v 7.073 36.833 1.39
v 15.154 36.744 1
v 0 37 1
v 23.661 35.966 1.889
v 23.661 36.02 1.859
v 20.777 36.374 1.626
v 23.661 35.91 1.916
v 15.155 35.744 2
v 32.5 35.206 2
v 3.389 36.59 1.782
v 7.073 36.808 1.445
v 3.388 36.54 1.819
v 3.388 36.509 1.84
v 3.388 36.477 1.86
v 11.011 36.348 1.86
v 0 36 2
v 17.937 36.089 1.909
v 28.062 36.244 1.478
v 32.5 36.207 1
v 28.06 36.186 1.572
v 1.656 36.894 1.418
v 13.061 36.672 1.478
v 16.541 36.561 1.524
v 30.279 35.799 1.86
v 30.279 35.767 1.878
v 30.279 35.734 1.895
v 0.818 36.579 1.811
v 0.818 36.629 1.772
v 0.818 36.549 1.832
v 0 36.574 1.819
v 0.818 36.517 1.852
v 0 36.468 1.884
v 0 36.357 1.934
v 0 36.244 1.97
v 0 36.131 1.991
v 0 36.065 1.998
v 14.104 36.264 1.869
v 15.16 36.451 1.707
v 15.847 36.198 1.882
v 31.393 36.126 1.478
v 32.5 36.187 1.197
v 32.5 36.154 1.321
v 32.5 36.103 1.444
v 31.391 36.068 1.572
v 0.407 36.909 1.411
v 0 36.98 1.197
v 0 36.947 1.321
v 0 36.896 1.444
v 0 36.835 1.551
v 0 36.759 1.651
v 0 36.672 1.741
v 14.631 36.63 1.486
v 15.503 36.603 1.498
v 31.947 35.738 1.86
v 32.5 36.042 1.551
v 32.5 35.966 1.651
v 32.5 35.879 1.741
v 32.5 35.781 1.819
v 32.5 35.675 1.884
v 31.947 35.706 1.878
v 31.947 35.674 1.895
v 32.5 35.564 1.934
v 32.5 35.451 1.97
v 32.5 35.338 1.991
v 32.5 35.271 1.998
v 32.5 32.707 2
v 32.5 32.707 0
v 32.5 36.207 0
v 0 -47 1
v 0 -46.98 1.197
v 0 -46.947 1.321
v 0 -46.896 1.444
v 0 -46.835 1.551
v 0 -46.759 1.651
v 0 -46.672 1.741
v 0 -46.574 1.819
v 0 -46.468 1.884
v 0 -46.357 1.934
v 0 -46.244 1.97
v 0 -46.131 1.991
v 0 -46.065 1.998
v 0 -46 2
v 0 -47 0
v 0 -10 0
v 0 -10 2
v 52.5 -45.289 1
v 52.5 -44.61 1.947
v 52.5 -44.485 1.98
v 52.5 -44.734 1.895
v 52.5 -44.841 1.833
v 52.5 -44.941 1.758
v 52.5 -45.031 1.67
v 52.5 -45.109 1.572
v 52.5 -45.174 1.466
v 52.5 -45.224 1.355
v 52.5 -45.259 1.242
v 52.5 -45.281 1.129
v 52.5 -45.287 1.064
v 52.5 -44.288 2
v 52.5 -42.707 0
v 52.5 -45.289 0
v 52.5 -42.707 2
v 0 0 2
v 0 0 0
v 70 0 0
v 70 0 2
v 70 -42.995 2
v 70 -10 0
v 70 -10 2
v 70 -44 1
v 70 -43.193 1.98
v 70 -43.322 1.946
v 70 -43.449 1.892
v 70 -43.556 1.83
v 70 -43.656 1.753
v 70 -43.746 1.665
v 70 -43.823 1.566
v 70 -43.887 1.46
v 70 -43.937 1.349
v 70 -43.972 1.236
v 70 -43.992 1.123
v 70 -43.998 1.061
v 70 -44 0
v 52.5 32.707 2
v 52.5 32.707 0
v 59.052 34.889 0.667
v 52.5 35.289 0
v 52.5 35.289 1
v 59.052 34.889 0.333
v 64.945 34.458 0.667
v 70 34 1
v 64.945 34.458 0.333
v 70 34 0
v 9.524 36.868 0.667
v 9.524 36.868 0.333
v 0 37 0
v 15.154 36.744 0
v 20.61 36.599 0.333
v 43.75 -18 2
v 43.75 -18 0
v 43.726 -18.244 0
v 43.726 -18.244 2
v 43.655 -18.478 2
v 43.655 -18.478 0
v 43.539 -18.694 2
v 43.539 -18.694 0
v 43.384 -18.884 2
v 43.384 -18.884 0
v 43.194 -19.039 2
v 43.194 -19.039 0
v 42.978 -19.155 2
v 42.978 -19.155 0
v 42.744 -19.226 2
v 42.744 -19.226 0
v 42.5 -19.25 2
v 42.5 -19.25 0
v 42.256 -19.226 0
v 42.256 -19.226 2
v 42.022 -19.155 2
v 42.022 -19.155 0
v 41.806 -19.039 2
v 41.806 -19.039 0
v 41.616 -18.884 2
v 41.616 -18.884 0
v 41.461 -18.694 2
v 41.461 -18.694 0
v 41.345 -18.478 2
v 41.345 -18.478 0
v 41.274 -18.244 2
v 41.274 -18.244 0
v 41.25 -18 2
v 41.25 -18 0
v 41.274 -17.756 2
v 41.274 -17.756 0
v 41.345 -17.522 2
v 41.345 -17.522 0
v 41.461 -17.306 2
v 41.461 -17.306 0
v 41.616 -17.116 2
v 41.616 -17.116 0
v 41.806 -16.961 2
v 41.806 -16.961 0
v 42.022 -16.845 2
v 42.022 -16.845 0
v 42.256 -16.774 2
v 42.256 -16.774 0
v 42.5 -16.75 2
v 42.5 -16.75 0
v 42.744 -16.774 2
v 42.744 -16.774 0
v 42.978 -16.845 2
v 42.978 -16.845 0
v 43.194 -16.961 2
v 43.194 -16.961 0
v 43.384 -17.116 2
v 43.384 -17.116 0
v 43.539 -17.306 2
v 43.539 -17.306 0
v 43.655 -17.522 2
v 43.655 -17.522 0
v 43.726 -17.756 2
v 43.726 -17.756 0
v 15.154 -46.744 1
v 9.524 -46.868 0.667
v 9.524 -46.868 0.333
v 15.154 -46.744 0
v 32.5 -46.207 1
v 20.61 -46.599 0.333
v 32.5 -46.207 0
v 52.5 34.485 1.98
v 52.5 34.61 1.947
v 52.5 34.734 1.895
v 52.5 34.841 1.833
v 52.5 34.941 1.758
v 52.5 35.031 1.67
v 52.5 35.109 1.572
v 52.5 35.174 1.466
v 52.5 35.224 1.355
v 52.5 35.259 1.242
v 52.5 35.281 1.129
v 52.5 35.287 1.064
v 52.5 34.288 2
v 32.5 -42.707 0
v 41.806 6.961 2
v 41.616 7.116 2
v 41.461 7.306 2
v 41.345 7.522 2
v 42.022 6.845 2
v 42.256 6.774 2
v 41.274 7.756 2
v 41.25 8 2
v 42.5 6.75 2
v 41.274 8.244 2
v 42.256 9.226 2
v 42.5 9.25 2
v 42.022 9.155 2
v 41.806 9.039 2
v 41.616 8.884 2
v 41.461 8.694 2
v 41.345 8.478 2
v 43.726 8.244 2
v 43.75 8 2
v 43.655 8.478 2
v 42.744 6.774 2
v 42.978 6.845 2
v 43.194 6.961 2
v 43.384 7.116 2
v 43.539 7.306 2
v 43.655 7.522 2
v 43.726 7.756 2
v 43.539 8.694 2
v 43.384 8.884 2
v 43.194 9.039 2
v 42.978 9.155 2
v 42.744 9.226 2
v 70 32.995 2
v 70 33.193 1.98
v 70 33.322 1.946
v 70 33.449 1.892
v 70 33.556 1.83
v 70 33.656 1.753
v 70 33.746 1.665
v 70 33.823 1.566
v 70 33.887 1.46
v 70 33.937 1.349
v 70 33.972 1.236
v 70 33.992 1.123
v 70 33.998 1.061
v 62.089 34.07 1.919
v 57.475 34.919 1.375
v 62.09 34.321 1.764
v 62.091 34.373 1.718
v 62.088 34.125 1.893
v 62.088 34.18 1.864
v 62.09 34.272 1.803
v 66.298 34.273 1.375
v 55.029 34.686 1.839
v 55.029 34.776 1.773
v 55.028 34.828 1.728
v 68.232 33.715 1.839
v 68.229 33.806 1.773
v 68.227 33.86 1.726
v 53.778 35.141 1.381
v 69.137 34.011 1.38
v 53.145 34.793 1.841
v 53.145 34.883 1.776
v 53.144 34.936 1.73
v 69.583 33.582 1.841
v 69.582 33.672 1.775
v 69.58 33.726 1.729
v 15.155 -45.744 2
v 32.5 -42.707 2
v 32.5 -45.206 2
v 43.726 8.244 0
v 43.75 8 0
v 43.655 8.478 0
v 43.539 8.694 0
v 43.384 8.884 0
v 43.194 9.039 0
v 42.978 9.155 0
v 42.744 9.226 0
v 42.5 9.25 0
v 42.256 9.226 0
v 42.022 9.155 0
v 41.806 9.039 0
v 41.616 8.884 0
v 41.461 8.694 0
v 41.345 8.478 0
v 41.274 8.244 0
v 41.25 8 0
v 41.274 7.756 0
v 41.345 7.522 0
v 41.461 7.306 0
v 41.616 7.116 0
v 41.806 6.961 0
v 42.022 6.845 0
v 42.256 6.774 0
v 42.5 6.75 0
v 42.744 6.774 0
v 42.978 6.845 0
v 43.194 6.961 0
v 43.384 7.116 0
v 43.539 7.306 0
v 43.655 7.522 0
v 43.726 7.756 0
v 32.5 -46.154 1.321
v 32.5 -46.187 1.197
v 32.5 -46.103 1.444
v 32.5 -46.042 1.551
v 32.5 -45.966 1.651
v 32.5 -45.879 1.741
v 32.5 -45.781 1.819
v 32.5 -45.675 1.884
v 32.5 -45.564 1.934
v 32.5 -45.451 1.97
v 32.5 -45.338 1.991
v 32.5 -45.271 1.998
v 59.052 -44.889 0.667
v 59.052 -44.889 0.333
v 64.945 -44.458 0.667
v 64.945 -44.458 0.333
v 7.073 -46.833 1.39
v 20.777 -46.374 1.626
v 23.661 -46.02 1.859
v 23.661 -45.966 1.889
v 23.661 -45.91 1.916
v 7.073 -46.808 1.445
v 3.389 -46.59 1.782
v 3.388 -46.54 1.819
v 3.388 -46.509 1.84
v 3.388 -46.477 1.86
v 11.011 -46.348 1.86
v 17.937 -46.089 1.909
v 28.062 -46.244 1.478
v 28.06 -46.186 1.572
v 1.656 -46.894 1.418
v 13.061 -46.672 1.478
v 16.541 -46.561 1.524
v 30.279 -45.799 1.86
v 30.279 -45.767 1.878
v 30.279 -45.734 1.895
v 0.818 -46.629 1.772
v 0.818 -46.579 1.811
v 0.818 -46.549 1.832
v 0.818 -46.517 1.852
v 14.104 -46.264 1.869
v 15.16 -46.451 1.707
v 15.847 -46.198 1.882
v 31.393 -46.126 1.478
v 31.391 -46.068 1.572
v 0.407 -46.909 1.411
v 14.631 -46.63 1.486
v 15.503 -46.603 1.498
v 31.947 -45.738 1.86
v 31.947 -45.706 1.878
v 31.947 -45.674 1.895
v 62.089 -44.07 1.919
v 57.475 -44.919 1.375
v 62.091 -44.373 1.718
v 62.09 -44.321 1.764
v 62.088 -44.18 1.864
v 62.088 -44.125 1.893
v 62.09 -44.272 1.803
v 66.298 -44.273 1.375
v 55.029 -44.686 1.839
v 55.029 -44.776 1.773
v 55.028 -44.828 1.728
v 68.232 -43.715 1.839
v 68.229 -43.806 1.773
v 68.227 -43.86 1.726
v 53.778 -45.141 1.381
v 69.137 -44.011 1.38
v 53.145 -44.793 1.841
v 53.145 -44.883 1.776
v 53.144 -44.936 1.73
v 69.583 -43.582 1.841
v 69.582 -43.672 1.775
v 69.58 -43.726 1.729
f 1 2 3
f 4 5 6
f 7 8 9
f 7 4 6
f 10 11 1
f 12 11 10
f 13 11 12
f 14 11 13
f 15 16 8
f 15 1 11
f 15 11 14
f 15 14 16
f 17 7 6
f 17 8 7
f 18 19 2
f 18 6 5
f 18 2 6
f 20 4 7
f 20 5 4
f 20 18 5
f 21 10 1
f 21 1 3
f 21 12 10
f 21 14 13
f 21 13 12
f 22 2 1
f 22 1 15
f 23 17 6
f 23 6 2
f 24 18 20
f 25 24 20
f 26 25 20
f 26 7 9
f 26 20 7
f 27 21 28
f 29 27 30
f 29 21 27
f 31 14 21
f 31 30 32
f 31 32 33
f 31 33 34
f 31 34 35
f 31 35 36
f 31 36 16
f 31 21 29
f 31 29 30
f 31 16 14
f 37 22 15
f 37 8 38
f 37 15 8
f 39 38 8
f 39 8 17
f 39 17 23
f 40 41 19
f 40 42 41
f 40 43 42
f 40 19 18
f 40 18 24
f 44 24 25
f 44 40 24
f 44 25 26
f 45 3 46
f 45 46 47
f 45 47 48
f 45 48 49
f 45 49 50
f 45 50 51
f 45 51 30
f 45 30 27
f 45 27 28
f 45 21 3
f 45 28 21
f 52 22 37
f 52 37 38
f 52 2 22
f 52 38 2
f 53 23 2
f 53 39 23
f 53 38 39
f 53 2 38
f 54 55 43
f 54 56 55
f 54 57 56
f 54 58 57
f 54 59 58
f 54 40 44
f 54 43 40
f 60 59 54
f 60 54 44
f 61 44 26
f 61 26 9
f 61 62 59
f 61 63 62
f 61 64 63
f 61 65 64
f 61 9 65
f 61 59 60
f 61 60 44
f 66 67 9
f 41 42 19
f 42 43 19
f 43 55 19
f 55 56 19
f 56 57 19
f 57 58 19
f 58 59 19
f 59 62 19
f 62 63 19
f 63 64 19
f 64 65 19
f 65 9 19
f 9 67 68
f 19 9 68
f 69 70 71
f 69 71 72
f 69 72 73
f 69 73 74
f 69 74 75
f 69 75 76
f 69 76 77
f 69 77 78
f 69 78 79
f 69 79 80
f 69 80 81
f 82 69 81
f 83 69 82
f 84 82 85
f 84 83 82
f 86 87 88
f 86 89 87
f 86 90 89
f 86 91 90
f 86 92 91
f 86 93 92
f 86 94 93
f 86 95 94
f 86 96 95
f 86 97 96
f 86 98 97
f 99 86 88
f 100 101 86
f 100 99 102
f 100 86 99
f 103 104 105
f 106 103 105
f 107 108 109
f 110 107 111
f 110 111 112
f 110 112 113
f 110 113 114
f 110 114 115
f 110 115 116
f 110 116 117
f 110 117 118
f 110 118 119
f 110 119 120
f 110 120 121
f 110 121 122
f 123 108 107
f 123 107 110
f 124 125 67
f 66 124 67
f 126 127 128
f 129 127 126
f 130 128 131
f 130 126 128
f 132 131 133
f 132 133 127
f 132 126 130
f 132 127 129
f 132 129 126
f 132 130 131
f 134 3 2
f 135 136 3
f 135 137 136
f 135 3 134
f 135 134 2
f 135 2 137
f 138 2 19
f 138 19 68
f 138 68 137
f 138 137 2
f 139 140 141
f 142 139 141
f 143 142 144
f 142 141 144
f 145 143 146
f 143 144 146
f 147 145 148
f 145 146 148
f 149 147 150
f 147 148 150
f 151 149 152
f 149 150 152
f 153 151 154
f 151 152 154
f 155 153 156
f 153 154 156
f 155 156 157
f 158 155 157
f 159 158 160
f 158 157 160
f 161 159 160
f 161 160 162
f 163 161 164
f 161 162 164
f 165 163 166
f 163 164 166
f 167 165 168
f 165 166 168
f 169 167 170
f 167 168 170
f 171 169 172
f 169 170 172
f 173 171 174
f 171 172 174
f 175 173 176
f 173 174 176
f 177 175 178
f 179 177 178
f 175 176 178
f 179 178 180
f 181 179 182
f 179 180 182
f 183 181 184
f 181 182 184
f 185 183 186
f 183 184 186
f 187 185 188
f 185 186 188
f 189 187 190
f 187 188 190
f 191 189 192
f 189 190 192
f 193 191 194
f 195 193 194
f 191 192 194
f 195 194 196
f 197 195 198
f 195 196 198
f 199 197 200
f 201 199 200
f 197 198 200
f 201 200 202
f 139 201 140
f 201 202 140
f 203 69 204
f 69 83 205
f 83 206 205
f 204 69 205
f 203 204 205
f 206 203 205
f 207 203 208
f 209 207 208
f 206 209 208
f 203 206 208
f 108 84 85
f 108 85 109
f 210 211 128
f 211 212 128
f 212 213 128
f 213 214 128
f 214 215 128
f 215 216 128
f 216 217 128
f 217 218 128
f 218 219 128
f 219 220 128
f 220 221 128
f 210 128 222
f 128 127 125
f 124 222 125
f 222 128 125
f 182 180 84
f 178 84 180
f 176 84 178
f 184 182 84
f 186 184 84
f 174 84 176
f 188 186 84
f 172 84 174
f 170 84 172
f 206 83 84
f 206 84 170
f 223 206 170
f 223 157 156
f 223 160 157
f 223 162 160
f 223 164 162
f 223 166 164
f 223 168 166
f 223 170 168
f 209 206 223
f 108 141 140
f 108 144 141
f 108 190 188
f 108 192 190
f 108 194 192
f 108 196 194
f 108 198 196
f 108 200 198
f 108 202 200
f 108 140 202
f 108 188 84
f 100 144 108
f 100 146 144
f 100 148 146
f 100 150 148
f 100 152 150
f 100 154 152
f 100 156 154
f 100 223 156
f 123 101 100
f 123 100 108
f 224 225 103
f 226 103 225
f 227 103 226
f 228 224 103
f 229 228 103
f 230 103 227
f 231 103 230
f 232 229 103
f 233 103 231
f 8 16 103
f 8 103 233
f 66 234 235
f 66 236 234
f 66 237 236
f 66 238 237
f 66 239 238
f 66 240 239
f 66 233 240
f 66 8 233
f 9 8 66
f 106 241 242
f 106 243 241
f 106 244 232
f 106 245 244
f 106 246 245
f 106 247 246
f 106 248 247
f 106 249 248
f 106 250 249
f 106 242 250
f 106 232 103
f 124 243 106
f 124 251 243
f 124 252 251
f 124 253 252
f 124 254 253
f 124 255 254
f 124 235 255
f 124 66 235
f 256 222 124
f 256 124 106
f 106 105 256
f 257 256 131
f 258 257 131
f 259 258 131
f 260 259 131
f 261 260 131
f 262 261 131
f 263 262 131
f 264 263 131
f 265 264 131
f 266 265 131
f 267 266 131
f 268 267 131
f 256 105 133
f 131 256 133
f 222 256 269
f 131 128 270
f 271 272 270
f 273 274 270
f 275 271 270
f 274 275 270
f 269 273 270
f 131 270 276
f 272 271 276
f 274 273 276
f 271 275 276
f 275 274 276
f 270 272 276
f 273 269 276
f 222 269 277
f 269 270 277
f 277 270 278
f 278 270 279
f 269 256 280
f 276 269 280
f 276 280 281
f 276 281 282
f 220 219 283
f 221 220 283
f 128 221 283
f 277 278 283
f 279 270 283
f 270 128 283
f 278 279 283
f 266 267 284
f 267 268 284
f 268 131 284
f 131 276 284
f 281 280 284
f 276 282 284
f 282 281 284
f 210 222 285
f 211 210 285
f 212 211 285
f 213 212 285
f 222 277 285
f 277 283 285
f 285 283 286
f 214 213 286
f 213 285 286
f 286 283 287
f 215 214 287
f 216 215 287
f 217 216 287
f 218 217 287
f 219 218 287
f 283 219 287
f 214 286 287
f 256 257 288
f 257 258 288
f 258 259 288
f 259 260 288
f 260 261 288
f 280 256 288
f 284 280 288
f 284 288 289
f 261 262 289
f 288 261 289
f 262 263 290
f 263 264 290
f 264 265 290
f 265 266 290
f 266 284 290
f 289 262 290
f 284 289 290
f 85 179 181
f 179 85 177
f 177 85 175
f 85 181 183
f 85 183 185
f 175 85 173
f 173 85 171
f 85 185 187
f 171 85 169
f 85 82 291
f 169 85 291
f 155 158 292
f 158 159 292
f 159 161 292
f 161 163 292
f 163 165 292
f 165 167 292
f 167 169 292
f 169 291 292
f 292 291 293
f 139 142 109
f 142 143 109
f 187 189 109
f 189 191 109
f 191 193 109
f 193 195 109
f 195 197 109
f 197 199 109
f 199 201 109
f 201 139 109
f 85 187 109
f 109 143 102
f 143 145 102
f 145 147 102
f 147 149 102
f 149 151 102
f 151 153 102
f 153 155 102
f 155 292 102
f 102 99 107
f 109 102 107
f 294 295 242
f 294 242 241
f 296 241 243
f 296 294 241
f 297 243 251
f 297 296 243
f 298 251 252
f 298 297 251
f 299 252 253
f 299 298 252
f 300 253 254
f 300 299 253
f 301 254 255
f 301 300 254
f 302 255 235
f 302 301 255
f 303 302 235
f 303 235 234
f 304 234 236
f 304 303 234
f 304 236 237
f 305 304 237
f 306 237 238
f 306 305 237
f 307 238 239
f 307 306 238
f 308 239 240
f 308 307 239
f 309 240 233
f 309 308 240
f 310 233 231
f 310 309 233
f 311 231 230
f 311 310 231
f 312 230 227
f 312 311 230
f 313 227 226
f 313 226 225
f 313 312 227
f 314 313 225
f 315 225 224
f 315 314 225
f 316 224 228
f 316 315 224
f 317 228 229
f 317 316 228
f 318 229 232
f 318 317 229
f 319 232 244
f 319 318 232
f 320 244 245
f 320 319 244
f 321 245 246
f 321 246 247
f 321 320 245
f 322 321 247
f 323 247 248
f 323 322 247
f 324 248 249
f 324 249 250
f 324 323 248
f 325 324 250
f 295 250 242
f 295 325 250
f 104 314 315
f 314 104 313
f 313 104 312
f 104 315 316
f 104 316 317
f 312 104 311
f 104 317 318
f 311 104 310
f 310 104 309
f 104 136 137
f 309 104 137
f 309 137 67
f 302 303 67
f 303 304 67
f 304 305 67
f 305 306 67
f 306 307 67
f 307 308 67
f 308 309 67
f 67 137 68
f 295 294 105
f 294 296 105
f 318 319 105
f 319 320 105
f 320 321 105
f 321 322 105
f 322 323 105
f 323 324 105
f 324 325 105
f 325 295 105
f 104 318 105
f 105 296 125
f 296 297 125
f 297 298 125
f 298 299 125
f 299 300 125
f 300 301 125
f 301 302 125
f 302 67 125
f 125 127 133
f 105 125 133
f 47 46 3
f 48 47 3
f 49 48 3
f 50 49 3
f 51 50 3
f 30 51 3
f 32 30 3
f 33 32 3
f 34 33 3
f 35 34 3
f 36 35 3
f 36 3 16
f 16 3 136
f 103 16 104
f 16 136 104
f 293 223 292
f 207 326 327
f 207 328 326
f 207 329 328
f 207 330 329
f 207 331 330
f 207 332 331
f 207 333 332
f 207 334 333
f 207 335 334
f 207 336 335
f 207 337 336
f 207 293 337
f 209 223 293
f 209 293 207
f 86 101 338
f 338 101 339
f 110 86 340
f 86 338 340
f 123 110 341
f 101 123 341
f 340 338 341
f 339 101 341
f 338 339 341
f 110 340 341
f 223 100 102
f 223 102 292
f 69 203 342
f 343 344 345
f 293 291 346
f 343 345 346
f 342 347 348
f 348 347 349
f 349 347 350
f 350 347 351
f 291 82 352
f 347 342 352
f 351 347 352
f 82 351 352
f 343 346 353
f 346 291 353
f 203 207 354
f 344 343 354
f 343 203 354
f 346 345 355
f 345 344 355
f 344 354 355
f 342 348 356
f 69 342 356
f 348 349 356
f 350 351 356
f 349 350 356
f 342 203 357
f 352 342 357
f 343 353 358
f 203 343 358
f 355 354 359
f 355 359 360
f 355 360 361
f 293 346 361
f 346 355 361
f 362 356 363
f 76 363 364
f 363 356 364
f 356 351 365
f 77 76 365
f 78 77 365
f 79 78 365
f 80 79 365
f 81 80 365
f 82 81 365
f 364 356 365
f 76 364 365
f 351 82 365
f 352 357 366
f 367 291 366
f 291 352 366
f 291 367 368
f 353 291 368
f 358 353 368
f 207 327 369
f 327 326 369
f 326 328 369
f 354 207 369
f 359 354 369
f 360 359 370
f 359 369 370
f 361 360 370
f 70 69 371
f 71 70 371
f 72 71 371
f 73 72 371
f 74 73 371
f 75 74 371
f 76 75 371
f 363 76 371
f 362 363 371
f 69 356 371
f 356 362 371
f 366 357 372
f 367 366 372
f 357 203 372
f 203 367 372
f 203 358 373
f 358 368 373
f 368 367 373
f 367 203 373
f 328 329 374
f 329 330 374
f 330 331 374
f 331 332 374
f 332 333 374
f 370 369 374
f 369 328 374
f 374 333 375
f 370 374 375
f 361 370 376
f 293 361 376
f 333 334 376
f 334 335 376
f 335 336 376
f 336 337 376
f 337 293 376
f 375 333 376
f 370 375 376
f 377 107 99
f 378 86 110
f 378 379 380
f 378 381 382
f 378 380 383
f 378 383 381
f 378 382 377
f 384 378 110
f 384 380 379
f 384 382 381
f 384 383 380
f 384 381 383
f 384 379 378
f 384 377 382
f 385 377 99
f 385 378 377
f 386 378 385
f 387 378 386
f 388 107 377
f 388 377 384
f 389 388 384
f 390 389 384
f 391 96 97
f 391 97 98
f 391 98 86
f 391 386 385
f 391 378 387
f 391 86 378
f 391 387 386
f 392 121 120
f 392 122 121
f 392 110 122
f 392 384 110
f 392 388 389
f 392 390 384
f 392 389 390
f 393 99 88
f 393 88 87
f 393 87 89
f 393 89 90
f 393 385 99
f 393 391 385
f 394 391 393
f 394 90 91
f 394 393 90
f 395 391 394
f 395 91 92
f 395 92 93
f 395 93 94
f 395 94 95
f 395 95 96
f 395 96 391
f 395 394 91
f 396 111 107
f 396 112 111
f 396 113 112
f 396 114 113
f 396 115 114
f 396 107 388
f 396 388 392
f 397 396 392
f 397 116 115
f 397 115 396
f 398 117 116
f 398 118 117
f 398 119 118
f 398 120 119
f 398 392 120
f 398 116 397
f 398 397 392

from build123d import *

# Parameters (mm, degrees)
F0_R     = 1.25
F1_DEPTH = 2
F2_DEPTH = 2
F3_R     = 1


# Not quite as in the source:
# - a feature names something its author has since deleted; it is built from what else it names


with BuildPart() as f1:
    # F0 (on Top) → F1 (new body)
    with BuildSketch(Plane.XY):
        with BuildLine():
            Line((0, 37), (0, 0))
            Line((0, 0), (70, 0))
            Line((70, 0), (70, 34))
            add(Edge.make_bspline(
                [(52.5, 35.2891019981), (59.3214395591, 34.9055787176), (65.4248555138, 34.4712498014), (70, 34)],
                knots=[50.2368914557, 50.2368914557, 50.2368914557, 50.2368914557, 70.0642562224, 70.0642562224, 70.0642562224, 70.0642562224], degree=3))
            Line((52.5, 35.2891019981), (52.5, 32.7070827343))
            Line((52.5, 32.7070827343), (32.5, 32.7070827343))
            Line((32.5, 32.7070827343), (32.5, 36.2070827343))
            add(Edge.make_bspline(
                [(0, 37), (8.4901566801, 36.9403682594), (20.460276432, 36.6565820507), (32.5, 36.2070827343)],
                knots=[0, 0, 0, 0, 32.0129533553, 32.0129533553, 32.0129533553, 32.0129533553], degree=3))
        make_face()
        with Locations((42.5, 8)):
            Circle(F0_R, mode=Mode.SUBTRACT)
    extrude(amount=F1_DEPTH)

    # F0 (on Top) → F2 (join)
    with BuildSketch(Plane.XY):
        with BuildLine():
            Line((0, 37), (0, 0))
            Line((0, 0), (70, 0))
            Line((70, 0), (70, 34))
            add(Edge.make_bspline(
                [(52.5, 35.2891019981), (59.3214395591, 34.9055787176), (65.4248555138, 34.4712498014), (70, 34)],
                knots=[50.2368914557, 50.2368914557, 50.2368914557, 50.2368914557, 70.0642562224, 70.0642562224, 70.0642562224, 70.0642562224], degree=3))
            Line((52.5, 35.2891019981), (52.5, 32.7070827343))
            Line((52.5, 32.7070827343), (32.5, 32.7070827343))
            Line((32.5, 32.7070827343), (32.5, 36.2070827343))
            add(Edge.make_bspline(
                [(0, 37), (8.4901566801, 36.9403682594), (20.460276432, 36.6565820507), (32.5, 36.2070827343)],
                knots=[0, 0, 0, 0, 32.0129533553, 32.0129533553, 32.0129533553, 32.0129533553], degree=3))
        make_face()
        with Locations((42.5, 8)):
            Circle(F0_R, mode=Mode.SUBTRACT)
    extrude(amount=F2_DEPTH)

    # F3
    f3_edges = [f1.edges().sort_by_distance(p)[0] for p in [
        (16.252703, 36.716727, 2),
        (61.256993, 34.737622, 2),
    ]]
    fillet(f3_edges, radius=F3_R)


with BuildPart() as f5_1:
    # F5: instance of F1
    add(f1.part.mirror(Plane(origin=(35, -5, 1), x_dir=(1, 0, 0), z_dir=(0, -1, 0))))


solid = Compound([f1.part, f5_1.part])
